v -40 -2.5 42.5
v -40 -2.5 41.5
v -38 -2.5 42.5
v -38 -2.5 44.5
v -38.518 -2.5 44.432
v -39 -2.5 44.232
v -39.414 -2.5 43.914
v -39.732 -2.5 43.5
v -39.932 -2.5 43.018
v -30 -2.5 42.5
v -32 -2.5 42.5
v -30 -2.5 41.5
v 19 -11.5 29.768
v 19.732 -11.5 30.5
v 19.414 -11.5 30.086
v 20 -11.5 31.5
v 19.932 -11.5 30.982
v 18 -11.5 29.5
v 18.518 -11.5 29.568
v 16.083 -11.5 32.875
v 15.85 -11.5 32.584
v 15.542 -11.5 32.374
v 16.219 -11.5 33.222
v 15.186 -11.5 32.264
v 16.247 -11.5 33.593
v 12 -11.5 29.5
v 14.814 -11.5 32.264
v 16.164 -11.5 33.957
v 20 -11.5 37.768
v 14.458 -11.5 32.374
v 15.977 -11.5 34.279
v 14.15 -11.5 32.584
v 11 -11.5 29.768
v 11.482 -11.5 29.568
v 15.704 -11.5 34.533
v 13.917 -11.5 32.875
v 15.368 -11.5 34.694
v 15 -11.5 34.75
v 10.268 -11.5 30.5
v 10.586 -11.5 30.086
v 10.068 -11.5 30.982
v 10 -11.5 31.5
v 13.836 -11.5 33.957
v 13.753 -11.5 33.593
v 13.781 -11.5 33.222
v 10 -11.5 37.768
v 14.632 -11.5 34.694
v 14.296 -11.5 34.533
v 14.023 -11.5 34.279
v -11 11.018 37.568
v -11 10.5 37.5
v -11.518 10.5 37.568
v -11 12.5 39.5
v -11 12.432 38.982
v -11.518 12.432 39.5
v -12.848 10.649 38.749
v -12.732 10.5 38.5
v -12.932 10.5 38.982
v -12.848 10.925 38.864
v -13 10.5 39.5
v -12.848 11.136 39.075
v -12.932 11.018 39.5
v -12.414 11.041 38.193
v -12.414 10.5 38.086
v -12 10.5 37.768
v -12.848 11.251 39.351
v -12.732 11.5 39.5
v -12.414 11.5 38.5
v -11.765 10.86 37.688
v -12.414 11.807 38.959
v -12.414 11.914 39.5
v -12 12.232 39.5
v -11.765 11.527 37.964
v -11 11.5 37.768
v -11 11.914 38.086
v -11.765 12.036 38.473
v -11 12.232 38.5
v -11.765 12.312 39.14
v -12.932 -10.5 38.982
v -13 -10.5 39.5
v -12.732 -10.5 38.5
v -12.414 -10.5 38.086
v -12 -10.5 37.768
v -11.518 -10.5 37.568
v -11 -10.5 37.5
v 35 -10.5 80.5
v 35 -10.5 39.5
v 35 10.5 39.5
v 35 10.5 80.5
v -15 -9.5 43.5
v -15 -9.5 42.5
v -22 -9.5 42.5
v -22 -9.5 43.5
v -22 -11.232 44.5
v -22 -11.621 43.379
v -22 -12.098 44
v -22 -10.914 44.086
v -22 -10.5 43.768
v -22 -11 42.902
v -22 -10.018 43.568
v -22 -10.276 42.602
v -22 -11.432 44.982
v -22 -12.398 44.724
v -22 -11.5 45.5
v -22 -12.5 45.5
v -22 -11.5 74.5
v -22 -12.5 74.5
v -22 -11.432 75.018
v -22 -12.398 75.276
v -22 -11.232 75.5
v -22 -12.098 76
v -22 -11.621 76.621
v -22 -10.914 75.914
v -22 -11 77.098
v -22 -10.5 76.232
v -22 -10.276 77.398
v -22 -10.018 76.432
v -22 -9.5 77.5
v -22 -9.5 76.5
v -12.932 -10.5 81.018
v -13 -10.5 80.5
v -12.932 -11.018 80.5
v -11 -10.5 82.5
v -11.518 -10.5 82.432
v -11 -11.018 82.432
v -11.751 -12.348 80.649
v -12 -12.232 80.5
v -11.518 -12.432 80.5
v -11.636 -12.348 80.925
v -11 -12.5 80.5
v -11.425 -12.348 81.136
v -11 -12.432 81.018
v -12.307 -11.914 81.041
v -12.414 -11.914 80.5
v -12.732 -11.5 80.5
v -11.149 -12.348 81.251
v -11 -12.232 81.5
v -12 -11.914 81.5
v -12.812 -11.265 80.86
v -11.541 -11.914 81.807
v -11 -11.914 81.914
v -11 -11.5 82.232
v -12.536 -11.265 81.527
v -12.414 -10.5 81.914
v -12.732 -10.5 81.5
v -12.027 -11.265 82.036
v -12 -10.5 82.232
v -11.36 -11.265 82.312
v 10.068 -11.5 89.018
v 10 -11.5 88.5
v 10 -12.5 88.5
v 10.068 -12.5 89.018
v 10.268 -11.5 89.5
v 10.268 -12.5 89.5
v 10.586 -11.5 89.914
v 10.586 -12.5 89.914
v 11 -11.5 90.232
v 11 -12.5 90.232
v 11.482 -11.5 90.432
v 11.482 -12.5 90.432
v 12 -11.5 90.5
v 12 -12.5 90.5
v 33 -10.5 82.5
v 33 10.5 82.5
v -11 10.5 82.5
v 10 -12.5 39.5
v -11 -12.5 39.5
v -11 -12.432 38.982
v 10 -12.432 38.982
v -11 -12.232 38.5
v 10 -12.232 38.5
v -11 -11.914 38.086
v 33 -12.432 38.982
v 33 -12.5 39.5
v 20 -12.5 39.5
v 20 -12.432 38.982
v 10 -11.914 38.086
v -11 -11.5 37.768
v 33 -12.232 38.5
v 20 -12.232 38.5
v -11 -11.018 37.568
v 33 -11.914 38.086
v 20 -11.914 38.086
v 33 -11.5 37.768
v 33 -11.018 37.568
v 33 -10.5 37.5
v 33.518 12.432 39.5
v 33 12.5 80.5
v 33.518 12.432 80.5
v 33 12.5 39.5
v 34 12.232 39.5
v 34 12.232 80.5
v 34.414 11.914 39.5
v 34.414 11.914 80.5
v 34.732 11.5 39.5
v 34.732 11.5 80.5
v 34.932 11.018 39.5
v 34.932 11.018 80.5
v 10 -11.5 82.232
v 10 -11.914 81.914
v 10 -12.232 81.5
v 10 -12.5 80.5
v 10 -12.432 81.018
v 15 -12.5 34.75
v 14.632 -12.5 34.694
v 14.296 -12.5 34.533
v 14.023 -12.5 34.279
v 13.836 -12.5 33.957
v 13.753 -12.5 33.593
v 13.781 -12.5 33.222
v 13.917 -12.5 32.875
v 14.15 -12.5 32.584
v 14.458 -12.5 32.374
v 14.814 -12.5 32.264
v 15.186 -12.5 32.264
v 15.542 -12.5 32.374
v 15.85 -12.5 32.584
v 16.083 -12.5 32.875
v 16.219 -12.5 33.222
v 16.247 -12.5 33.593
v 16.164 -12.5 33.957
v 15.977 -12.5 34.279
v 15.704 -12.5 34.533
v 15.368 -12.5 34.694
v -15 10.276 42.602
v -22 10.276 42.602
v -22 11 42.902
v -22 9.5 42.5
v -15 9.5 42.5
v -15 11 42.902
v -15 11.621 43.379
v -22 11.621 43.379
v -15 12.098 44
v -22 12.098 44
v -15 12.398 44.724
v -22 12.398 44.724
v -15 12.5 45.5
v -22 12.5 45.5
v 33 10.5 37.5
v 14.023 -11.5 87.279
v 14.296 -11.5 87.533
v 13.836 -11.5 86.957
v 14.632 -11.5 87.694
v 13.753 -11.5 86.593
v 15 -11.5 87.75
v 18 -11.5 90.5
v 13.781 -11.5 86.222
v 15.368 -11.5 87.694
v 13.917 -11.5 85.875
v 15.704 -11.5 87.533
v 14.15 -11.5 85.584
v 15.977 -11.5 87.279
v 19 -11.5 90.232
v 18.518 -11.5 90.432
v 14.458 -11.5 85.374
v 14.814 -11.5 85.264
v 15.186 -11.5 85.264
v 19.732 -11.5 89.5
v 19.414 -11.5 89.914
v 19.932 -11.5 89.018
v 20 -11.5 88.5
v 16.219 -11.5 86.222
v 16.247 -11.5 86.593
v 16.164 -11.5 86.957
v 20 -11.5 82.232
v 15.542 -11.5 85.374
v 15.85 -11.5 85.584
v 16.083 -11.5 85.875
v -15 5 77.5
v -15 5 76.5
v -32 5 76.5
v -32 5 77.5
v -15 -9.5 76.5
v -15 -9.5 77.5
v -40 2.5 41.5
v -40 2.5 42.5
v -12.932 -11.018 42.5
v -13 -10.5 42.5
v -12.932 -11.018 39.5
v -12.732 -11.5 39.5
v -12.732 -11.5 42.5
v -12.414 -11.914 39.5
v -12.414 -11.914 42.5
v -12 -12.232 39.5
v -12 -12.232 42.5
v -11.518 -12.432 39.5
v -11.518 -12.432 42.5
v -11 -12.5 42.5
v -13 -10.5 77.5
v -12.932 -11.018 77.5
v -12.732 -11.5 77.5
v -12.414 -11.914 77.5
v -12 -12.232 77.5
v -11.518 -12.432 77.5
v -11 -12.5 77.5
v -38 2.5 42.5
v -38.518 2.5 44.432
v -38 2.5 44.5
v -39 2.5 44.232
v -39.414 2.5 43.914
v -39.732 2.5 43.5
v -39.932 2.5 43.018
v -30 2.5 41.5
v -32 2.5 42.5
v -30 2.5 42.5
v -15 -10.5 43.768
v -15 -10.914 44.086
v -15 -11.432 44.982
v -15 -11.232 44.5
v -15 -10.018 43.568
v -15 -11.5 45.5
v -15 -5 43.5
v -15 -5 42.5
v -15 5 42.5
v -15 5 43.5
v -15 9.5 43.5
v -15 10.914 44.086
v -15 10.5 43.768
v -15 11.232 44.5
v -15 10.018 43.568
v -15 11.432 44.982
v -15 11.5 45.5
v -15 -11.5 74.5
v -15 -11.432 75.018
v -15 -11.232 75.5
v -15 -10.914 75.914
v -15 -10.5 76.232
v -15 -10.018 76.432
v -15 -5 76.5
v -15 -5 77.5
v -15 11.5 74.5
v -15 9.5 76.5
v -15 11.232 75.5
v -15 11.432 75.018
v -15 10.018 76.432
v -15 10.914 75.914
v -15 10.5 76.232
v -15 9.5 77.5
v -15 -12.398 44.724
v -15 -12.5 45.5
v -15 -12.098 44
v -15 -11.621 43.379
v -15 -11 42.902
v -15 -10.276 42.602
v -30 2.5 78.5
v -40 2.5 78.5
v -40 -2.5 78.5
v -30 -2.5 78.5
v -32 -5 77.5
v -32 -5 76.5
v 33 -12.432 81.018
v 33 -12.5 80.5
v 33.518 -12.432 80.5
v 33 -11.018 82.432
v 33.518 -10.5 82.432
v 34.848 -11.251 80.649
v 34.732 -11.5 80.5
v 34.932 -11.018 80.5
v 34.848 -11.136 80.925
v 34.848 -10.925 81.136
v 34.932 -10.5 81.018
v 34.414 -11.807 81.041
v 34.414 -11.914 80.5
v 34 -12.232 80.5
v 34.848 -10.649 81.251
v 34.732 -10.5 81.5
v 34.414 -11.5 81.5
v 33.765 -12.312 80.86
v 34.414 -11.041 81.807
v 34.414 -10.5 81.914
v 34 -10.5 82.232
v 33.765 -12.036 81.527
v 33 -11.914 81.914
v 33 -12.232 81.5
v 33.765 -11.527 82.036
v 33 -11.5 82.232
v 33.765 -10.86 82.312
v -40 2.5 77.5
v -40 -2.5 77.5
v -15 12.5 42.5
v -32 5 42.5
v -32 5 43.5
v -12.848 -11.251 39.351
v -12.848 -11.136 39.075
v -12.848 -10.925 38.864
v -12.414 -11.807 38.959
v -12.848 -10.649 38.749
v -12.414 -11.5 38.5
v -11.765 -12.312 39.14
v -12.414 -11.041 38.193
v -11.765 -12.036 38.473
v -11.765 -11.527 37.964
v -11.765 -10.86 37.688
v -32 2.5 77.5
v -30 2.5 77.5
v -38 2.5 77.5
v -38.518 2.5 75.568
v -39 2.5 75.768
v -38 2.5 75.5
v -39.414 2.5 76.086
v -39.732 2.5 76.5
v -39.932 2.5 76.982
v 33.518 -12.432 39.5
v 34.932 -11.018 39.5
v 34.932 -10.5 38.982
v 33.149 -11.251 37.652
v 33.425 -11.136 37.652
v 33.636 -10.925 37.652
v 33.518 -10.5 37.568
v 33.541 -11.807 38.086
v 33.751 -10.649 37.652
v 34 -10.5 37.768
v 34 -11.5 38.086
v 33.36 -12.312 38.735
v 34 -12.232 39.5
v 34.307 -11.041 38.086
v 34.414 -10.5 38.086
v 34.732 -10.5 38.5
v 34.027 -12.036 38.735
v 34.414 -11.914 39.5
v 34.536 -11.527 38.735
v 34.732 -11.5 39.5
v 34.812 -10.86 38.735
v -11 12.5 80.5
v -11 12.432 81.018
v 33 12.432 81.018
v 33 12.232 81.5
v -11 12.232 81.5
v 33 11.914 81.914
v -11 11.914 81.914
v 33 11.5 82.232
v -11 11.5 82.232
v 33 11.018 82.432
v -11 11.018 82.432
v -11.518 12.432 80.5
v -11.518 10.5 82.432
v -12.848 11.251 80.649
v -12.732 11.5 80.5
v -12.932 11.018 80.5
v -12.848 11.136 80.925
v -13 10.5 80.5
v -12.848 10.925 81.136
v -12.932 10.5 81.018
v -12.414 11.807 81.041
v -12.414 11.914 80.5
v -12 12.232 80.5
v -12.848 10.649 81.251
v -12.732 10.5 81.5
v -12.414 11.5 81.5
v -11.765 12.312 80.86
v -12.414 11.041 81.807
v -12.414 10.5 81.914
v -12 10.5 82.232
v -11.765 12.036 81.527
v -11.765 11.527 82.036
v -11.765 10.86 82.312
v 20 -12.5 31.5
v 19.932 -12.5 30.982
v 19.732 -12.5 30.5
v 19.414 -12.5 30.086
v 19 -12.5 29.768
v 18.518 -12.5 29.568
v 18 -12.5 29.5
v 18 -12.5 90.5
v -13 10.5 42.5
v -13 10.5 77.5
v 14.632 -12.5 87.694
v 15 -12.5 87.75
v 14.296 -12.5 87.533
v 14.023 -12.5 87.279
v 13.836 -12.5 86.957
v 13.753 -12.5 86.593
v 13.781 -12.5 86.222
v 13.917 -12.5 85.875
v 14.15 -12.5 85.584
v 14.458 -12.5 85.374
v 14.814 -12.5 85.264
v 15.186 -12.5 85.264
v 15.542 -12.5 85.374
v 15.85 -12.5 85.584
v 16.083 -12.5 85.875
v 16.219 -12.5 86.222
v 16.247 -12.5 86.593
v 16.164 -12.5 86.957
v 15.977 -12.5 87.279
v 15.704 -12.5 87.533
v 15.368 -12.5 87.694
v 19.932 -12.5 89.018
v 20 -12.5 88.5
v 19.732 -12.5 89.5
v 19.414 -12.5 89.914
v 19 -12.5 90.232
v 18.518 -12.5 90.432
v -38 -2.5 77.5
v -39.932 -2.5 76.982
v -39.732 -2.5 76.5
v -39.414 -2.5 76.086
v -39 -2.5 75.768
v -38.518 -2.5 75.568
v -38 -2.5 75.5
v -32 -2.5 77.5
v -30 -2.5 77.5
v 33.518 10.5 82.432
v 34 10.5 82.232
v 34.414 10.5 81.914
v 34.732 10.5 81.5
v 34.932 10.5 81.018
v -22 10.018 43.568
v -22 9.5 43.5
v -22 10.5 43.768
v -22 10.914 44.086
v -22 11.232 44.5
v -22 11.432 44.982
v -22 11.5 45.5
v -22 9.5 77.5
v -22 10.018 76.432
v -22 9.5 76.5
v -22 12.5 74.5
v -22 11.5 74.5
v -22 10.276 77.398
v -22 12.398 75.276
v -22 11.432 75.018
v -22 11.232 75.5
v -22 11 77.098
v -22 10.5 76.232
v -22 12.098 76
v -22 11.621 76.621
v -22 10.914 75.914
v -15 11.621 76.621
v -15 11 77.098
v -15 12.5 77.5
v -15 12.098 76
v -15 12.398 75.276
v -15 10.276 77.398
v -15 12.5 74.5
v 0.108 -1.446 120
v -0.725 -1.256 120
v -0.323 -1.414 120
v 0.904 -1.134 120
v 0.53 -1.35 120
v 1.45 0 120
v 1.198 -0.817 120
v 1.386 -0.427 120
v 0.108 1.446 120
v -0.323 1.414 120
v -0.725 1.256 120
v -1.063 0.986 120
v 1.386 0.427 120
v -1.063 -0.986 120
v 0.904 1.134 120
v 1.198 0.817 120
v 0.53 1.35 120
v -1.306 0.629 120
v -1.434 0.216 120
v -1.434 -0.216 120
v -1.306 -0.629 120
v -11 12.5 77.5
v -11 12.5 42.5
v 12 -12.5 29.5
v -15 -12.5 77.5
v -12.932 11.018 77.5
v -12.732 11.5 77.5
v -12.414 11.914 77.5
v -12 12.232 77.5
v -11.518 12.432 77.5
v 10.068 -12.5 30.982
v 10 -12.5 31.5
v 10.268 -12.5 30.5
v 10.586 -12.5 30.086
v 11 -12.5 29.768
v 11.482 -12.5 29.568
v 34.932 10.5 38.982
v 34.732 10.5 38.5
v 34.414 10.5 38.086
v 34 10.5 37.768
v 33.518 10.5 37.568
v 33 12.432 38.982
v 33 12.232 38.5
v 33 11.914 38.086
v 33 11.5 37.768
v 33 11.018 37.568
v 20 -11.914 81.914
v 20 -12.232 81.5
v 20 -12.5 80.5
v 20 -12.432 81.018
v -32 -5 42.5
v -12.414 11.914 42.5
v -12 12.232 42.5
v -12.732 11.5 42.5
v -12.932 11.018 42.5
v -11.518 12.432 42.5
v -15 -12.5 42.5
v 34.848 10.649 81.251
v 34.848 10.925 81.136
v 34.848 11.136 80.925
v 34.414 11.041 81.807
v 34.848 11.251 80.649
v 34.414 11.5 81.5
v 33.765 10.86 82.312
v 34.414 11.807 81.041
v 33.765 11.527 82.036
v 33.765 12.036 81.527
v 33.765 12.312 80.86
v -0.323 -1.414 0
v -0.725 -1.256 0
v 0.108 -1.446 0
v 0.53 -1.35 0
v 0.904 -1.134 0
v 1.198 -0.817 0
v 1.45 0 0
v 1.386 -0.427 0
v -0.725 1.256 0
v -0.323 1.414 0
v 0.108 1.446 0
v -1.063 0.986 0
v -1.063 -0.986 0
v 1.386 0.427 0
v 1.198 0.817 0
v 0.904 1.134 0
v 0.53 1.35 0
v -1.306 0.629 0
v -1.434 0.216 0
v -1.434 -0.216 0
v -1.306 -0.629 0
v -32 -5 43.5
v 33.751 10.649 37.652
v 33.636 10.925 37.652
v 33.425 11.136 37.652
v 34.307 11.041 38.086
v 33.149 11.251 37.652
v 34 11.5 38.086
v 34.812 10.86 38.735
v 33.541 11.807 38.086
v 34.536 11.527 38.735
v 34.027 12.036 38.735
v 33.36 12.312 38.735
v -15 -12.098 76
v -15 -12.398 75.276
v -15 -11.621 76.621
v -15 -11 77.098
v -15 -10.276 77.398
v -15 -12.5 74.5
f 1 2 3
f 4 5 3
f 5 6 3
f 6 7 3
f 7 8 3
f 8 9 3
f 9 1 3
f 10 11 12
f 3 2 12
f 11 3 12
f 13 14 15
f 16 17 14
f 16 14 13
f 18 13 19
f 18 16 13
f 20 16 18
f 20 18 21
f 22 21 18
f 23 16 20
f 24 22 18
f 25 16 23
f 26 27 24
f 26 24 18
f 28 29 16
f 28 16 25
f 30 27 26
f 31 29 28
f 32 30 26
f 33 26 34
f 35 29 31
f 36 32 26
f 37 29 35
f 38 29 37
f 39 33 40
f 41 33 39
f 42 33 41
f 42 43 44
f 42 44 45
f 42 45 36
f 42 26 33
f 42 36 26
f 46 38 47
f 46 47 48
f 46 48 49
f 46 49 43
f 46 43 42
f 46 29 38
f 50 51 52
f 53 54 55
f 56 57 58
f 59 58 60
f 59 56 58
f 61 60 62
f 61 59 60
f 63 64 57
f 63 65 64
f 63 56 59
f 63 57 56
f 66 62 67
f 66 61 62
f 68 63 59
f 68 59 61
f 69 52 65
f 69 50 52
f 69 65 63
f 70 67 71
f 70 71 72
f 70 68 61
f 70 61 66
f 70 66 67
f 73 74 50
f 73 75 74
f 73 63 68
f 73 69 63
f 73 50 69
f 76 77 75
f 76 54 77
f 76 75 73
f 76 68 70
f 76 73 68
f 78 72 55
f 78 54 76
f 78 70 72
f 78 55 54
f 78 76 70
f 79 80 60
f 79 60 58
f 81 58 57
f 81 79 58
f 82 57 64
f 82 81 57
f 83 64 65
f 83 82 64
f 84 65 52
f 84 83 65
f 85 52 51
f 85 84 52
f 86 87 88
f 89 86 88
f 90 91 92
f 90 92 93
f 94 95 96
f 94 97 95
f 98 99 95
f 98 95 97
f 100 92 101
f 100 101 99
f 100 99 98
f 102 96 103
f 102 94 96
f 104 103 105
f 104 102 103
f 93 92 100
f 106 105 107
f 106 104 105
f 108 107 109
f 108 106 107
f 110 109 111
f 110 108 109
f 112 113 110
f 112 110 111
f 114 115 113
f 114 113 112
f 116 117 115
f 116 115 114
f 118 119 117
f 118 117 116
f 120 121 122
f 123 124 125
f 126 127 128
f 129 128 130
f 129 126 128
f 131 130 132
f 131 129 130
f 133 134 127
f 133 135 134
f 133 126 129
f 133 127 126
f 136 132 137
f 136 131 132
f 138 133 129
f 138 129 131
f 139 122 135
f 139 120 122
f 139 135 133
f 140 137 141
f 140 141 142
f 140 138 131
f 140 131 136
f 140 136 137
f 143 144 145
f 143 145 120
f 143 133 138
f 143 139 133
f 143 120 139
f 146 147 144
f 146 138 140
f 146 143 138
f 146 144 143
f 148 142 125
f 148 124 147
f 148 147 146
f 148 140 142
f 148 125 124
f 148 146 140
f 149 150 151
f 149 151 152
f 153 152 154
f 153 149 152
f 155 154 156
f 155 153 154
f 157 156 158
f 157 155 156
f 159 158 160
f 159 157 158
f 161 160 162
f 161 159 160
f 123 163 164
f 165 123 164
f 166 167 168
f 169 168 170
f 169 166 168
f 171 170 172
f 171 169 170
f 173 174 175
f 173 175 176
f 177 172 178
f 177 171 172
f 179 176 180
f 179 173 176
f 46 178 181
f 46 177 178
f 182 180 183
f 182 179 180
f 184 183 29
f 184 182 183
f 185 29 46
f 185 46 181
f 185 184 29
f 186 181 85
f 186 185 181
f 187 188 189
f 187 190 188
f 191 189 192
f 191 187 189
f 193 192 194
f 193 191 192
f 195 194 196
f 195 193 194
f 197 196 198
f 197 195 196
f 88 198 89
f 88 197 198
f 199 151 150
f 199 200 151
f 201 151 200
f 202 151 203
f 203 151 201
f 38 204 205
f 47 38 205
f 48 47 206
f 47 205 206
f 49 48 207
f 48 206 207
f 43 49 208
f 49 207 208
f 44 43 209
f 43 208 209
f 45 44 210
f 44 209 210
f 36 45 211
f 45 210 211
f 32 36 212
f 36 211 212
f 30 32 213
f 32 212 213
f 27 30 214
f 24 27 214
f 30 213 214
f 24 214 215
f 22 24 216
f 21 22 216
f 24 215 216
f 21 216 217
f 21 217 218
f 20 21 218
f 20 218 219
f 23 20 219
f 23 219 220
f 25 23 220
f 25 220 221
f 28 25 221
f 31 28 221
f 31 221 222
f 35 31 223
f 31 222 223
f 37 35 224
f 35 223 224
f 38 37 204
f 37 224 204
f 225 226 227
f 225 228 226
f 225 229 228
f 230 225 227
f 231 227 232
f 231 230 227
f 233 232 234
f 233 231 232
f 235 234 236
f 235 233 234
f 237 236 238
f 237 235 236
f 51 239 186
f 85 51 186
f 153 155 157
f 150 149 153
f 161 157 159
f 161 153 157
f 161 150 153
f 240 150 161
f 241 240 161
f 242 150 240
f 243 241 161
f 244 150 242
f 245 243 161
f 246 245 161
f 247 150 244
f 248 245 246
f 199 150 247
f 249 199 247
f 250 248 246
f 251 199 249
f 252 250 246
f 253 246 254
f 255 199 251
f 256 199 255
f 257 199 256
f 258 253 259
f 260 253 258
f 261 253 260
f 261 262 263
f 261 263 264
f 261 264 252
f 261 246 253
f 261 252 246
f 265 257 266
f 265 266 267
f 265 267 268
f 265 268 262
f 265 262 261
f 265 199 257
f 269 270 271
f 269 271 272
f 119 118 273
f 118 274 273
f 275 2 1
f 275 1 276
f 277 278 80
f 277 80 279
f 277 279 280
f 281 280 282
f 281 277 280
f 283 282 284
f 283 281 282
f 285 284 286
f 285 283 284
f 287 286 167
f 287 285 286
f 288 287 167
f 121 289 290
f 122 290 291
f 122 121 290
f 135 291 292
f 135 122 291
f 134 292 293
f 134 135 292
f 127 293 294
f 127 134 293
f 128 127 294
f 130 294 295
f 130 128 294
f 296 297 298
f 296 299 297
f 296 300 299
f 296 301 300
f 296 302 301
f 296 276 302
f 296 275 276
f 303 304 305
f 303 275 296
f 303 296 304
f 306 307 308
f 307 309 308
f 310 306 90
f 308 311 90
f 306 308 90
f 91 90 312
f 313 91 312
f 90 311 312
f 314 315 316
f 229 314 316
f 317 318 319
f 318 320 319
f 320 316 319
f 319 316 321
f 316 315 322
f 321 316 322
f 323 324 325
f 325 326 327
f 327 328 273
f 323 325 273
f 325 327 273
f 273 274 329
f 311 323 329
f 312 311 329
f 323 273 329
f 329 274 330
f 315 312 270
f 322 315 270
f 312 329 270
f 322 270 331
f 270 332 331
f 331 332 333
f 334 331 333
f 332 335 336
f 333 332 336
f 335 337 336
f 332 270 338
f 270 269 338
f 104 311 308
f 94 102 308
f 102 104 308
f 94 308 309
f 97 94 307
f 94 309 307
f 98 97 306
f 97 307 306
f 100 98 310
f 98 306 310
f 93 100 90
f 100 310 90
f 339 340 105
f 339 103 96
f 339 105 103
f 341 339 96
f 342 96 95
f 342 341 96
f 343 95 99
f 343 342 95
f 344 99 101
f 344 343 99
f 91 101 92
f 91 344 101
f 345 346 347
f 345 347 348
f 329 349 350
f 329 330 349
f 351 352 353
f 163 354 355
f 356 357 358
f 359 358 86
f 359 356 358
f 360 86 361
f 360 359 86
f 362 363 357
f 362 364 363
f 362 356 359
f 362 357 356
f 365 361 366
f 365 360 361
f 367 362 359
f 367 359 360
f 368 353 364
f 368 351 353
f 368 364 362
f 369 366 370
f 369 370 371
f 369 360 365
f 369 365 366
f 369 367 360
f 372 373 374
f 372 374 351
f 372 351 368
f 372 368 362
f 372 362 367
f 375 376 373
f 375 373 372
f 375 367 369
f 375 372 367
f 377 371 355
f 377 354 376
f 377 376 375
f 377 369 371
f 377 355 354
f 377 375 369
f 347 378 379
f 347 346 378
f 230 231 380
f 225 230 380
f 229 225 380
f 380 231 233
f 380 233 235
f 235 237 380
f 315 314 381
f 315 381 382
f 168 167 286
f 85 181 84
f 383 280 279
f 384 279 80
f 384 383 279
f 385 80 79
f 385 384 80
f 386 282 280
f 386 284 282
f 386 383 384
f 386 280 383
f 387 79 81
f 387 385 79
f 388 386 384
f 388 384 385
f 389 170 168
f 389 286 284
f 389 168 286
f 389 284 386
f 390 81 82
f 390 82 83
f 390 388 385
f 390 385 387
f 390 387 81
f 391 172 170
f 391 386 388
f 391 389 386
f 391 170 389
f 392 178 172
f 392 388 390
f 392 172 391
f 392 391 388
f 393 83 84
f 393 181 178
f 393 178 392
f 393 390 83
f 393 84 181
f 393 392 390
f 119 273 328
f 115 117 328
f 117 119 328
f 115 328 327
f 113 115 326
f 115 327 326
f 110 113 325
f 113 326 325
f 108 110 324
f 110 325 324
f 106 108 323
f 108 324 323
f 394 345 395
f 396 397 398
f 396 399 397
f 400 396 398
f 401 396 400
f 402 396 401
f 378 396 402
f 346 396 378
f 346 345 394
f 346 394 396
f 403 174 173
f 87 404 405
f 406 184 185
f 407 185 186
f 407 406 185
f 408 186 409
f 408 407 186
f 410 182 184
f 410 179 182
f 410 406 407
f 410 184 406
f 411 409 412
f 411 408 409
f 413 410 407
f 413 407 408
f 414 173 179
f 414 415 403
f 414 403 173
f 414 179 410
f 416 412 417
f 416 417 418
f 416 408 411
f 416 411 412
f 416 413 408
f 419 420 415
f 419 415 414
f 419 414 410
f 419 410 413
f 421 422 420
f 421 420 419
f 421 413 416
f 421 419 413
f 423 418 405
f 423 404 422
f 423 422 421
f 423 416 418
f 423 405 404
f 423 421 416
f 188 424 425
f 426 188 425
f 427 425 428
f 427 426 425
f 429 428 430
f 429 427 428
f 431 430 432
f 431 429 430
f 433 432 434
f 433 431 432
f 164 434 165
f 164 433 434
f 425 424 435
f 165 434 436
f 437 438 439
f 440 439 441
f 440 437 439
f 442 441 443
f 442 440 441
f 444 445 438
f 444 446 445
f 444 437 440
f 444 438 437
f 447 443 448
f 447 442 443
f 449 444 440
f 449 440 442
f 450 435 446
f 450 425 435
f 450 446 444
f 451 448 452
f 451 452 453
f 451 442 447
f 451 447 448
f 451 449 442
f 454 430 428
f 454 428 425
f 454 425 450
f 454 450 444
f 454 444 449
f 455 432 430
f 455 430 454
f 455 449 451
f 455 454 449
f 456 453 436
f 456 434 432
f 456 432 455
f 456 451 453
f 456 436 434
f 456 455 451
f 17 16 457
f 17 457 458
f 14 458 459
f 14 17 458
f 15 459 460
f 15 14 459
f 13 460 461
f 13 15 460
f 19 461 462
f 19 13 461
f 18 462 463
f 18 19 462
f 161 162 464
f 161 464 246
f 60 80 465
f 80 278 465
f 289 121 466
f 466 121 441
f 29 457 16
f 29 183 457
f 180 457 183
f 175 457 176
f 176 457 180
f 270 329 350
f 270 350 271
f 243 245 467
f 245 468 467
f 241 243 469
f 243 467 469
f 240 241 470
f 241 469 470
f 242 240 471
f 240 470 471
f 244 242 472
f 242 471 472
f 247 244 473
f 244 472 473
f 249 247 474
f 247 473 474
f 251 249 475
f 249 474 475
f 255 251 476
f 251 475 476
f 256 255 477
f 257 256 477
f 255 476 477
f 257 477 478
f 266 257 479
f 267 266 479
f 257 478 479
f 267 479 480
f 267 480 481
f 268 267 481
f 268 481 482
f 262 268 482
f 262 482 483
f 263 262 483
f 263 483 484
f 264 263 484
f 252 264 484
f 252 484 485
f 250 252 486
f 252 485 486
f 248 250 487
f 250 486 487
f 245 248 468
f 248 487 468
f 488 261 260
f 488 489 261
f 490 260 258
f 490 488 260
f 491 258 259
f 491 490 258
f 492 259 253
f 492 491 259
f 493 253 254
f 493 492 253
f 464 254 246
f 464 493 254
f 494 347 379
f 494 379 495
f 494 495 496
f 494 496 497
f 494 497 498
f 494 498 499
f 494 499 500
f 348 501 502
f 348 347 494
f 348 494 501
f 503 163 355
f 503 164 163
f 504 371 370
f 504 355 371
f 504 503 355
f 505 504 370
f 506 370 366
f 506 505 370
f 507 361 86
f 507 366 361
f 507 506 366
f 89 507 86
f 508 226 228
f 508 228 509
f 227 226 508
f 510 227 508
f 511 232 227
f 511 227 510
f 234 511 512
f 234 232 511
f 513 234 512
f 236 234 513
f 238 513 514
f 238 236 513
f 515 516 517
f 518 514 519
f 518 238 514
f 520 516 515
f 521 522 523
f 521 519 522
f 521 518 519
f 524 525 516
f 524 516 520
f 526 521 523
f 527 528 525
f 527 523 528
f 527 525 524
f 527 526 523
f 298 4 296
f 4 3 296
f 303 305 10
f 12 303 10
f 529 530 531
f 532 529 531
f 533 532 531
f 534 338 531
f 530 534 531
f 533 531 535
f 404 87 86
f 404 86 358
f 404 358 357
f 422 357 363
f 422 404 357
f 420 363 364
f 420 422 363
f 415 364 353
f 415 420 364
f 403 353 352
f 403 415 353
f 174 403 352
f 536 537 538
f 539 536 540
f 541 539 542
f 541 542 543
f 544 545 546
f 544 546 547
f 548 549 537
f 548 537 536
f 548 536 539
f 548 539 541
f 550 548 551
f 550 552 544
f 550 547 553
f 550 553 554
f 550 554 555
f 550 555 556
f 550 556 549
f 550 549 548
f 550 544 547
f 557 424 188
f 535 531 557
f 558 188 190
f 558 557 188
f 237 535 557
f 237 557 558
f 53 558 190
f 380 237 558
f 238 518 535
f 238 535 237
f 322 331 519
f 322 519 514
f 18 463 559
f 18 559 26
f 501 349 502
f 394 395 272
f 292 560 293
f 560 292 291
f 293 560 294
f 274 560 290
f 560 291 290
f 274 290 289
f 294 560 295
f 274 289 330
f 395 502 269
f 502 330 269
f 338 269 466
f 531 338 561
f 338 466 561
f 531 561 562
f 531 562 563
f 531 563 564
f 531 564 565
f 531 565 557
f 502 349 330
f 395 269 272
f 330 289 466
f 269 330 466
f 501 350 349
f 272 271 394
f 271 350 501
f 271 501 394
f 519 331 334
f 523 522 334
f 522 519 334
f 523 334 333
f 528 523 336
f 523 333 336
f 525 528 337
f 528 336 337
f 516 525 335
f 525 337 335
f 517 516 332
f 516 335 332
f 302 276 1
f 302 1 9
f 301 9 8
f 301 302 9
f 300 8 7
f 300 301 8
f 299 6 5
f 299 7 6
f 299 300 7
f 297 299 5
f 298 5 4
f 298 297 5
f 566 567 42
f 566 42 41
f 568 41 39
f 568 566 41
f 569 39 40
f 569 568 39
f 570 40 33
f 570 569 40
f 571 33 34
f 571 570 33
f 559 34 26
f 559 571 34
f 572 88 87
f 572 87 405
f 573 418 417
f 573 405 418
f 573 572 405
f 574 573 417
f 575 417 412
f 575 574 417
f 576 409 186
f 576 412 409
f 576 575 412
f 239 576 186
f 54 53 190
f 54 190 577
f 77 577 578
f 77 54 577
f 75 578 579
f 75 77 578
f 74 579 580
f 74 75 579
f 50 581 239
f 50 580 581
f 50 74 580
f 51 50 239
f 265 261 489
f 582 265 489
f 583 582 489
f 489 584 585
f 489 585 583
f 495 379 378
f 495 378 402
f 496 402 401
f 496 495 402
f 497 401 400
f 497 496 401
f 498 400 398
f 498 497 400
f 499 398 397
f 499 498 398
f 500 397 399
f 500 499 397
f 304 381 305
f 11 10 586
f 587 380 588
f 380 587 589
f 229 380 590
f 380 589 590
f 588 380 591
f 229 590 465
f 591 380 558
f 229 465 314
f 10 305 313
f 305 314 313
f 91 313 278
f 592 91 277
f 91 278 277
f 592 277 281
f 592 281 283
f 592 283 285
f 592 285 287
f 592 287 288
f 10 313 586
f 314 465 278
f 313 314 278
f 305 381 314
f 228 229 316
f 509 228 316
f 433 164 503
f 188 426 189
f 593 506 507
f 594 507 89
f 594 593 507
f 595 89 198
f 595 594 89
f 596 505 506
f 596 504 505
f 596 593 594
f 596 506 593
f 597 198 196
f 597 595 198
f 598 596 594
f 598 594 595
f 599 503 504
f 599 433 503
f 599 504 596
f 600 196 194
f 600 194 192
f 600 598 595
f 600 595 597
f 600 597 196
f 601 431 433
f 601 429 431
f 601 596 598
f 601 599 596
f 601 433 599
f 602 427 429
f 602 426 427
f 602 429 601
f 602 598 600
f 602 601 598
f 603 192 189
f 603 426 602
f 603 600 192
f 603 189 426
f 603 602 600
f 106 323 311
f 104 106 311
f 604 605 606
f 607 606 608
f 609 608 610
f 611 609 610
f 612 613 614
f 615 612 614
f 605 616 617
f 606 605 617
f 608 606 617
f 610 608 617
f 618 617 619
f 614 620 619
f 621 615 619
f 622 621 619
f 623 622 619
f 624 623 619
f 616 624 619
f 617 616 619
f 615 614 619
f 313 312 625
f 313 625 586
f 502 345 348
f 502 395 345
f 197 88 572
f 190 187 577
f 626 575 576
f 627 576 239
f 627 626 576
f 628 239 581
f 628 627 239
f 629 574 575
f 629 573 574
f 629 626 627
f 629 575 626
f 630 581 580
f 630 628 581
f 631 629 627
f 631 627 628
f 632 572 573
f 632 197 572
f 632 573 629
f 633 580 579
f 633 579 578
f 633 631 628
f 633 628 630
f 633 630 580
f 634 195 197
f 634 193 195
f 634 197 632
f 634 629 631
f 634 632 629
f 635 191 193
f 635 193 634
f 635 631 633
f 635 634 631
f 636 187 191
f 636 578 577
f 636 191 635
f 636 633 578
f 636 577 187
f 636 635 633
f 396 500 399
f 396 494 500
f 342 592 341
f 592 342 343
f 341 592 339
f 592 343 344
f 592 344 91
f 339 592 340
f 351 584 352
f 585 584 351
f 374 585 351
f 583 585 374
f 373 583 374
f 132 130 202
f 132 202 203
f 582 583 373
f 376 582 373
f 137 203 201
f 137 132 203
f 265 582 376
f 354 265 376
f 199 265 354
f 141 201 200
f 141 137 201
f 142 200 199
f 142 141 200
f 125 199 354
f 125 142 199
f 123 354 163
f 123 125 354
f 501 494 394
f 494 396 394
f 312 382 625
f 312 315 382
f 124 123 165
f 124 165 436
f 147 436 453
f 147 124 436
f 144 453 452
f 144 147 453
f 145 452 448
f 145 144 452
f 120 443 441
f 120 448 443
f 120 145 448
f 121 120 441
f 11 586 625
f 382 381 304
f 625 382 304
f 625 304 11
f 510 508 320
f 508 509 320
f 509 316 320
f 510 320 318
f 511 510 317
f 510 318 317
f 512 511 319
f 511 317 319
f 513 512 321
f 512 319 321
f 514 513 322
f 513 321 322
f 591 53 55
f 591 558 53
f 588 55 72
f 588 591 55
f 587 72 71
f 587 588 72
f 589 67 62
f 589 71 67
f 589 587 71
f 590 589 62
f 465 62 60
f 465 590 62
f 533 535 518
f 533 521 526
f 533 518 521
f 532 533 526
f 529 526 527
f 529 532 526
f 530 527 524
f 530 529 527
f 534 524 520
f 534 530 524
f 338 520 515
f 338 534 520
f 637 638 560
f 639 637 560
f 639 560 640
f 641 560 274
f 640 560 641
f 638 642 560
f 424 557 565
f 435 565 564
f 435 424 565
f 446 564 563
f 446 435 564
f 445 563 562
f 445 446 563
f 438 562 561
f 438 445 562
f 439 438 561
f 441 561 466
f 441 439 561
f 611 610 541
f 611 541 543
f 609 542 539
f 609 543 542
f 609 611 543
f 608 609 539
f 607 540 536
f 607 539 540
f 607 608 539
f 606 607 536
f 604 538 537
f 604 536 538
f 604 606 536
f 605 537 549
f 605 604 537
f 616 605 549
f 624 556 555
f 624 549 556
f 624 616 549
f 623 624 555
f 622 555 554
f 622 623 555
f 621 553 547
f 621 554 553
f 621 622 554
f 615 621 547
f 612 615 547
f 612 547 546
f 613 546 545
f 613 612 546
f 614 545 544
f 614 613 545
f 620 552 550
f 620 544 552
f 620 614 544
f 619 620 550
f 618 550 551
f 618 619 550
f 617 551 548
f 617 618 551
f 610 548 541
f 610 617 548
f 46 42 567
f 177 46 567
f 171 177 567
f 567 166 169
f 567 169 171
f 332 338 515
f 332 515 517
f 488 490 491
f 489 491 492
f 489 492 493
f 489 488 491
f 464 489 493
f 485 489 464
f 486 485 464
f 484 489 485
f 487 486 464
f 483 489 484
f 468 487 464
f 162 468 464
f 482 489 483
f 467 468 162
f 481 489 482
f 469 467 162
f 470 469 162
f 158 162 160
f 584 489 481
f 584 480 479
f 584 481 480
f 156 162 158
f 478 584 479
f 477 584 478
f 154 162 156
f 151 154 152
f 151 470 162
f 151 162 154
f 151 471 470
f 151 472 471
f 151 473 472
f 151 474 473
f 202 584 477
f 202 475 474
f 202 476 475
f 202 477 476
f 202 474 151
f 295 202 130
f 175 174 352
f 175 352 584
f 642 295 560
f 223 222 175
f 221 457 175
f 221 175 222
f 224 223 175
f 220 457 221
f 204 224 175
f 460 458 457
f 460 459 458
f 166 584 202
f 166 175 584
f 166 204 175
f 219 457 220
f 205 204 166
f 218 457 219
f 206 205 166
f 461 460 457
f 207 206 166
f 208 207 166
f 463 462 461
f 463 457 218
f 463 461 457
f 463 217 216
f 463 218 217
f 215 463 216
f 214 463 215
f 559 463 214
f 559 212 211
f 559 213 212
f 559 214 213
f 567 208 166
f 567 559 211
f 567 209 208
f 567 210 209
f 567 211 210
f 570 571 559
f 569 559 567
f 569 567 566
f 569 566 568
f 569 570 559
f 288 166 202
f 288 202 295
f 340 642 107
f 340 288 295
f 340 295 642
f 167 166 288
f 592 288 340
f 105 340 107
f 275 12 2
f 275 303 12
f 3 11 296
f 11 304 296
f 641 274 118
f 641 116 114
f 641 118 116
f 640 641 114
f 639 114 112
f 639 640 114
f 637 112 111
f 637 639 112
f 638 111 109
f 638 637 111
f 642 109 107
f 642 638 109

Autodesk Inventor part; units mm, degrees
ref_plane "YZ Plane" through (0, 0, 0) normal (1, 0, 0) x (0, 1, 0)
sketch "Sketch1" plane through (0, 0, 0) normal (0, 0, 1) x (1, 0, 0)
  circle A0 centre (0, 0) radius 1.45
  dimension "d0" = 2.9
extrude "Extrusion1" add sketch "Sketch1" along normal blind 120
sketch "Sketch2" plane through (0, 0, 0) normal (1, 0, 0) x (0, 1, 0)
  line L0 (1.45, 120) -> (-1.45, 120) projected
  line L1 (-1.45, 0) -> (1.45, 0) projected
  line L2 (1.45, 0) -> (1.45, 120) projected
  line L3 (-1.45, 0) -> (-1.45, 120) projected
  line L4 (1.45, 0) -> (-1.45, 120) construction
  line L5 (1.45, 120) -> (-1.45, 0) construction
  line L6 (12.5, 37.5) -> (-12.5, 37.5)
  line L7 (-12.5, 37.5) -> (-12.5, 82.5)
  line L8 (-12.5, 82.5) -> (12.5, 82.5)
  line L9 (12.5, 82.5) -> (12.5, 37.5)
  line L10 (12.5, 37.5) -> (-12.5, 82.5) construction
  line L11 (-12.5, 37.5) -> (12.5, 82.5) construction
  line L12 (12.5, 42.5) -> (-12.5, 42.5)
  line L13 (-12.5, 42.5) -> (-12.5, 77.5)
  line L14 (-12.5, 77.5) -> (12.5, 77.5)
  line L15 (12.5, 77.5) -> (12.5, 42.5)
  line L16 (12.5, 42.5) -> (-12.5, 77.5) construction
  line L17 (-12.5, 42.5) -> (12.5, 77.5) construction
  point P0 (0, 60)
  dimension "d3" = 25
  dimension "d4" = 45
  dimension "d7" = 25
  dimension "d8" = 35
extrude "Extrusion2" add sketch "Sketch2" along normal blind 35 separate body contours L8 L9 L14 L2 | L2 L14 L3 L8 | L3 L14 L7 L8 | L14 L9 L12 L2 | L2 L12 L3 L14 | L3 L12 L7 L14 | L12 L9 L6 L2 | L2 L6 L3 L12 | L3 L6 L7 L12
extrude "Extrusion3" add sketch "Sketch2" against normal blind 15 contours L14 L9 L12 L2 | L2 L12 L3 L14 | L3 L12 L7 L14 bodies 2
sketch "Sketch3" plane through (-15, 0, 0) normal (-1, 0, 0) x (0, 0, 1)
  line L0 (42.5, 12.5) -> (42.5, -12.5) construction
  line L1 (37.5, -12.5) -> (82.5, -12.5) construction
  line L2 (42.5, 12.5) -> (77.5, 12.5) construction
  line L3 (77.5, 12.5) -> (77.5, -12.5) construction
  line L4 (77.5, -12.5) -> (42.5, -12.5) construction
  line L5 (42.5, -12.5) -> (42.5, 12.5) construction
  line L6 (77.5, 12.5) -> (77.5, -12.5) construction
  line L7 (42.5, 12.5) -> (77.5, 12.5) construction
  line L8 (77.5, 12.5) -> (77.5, 9.5) construction
  line L9 (77.5, 9.5) -> (42.5, 9.5) construction
  line L10 (42.5, 9.5) -> (42.5, 12.5) construction
  line L11 (77.5, 12.5) -> (77.5, -12.5) construction
  line L12 (42.5, -12.5) -> (77.5, -12.5) construction
  line L13 (77.5, -12.5) -> (77.5, -9.5) construction
  line L14 (77.5, -9.5) -> (42.5, -9.5) construction
  line L15 (42.5, -9.5) -> (42.5, -12.5) construction
  arc A0 (45.5, 12.5) -> (42.5, 9.5) centre (45.5, 9.5) ccw
  arc A1 (77.5, 9.5) -> (74.5, 12.5) centre (74.5, 9.5) ccw
  line L16 (45.5, 12.5) -> (74.5, 12.5)
  line L17 (37.5, 12.5) -> (82.5, 12.5) projected
  arc A2 (42.5, -9.5) -> (45.5, -12.5) centre (45.5, -9.5) ccw
  arc A3 (74.5, -12.5) -> (77.5, -9.5) centre (74.5, -9.5) ccw
  line L18 (45.5, -12.5) -> (74.5, -12.5)
  line L19 (42.5, 9.5) -> (43.5, 9.5)
  line L20 (77.5, 9.5) -> (76.5, 9.5)
  arc A4 (45.5, 11.5) -> (43.5, 9.5) centre (45.5, 9.5) ccw
  arc A5 (76.5, 9.5) -> (74.5, 11.5) centre (74.5, 9.5) ccw
  line L21 (74.5, 11.5) -> (45.5, 11.5)
  line L22 (42.5, -9.5) -> (43.5, -9.5)
  line L23 (77.5, -9.5) -> (76.5, -9.5)
  arc A6 (43.5, -9.5) -> (45.5, -11.5) centre (45.5, -9.5) ccw
  arc A7 (74.5, -11.5) -> (76.5, -9.5) centre (74.5, -9.5) ccw
  line L24 (74.5, -11.5) -> (45.5, -11.5)
  line L25 (42.5, 5) -> (43.5, 5)
  line L26 (43.5, 5) -> (43.5, -5)
  line L27 (43.5, -5) -> (42.5, -5)
  line L28 (42.5, -5) -> (42.5, 5)
  line L29 (42.5, 5) -> (43.5, -5) construction
  line L30 (43.5, 5) -> (42.5, -5) construction
  line L31 (77.5, -12.5) -> (77.5, 12.5) projected
  line L32 (76.5, 5) -> (77.5, 5)
  line L33 (77.5, 5) -> (77.5, -5)
  line L34 (77.5, -5) -> (76.5, -5)
  line L35 (76.5, -5) -> (76.5, 5)
  line L36 (76.5, 5) -> (77.5, -5) construction
  line L37 (77.5, 5) -> (76.5, -5) construction
  line L38 (42.5, 0) -> (77.5, 0) construction
  line L39 (42.5, 9.5) -> (43.5, 9.5) construction
  line L40 (43.5, 9.5) -> (43.5, -9.5) construction
  line L41 (43.5, -9.5) -> (42.5, -9.5) construction
  line L42 (42.5, -9.5) -> (42.5, 9.5) construction
  point P0 (0, 0)
  point P1 (77.5, 1.45)
  point P2 (77.5, -1.45)
  point P3 (43, 0)
  point P4 (77, 0)
  point P5 (43, 0)
  dimension "d11" = 3
  dimension "d12" = 3
  dimension "d13" = 1
  dimension "d14" = 1
  dimension "d15" = 1
  dimension "d16" = 1
  dimension "d17" = 1
  dimension "d18" = 1
  dimension "d21" = 10
  dimension "d22" = 10
  dimension "d23" = 35
  dimension "d24" = 17.5
  dimension "d25" = 32
extrude "Extrusion4" add sketch "Sketch3" along normal blind 7 contours L16 A1 L20 A5 L21 A4 L19 A0 | A3 L18 A2 L22 A6 L24 A7 L23 bodies 2
extrude "Extrusion5" add sketch "Sketch3" along normal blind 17 contours L31 L34 L35 L32 | L25 L26 L27 L28 bodies 2
sketch "Sketch5" plane through (-15, 12.5, 77.5) normal (0, 0, 1) x (1, 0, 0)
  line L0 (-25, -10) -> (-15, -10) construction
  line L1 (-15, -10) -> (-15, -15) construction
  line L2 (-15, -15) -> (-25, -15) construction
  line L3 (-25, -15) -> (-25, -10) construction
  line L4 (-25, -10) -> (-15, -15) construction
  line L5 (-15, -10) -> (-25, -15) construction
  line L6 (0, -17.5) -> (0, -7.5) construction
  line L7 (-25, -10) -> (-15, -10)
  line L8 (-15, -10) -> (-15, -15)
  line L9 (-15, -15) -> (-25, -15)
  line L10 (-25, -15) -> (-25, -10)
  point P0 (15, -12.5)
  point P1 (-20, -12.5)
  dimension "d28" = 10
  dimension "d29" = 5
  dimension "d32" = 15
extrude "Extrusion6" add sketch "Sketch5" along normal blind 1 bodies 2
sketch "Sketch6" plane through (0, -12.5, 42.5) normal (0, 0, -1) x (-1, 0, 0)
  line L0 (40, 15) -> (30, 15) projected
  line L1 (40, 10) -> (40, 15) projected
  line L2 (32, 10) -> (40, 10) projected
  line L3 (30, 15) -> (30, 10) projected
  line L4 (30, 10) -> (32, 10) projected
  point P0 (0, 12.5)
extrude "Extrusion7" add sketch "Sketch6" along normal blind 1 bodies 2
extrude "Extrusion8" add sketch "Sketch2" against normal blind 13 contours L8 L9 L14 L2 | L2 L14 L3 L8 | L3 L14 L7 L8 | L14 L9 L12 L2 | L2 L12 L3 L14 | L3 L12 L7 L14 | L12 L9 L6 L2 | L2 L6 L3 L12 | L3 L6 L7 L12 bodies 2
extrude "Extrusion9" cut sketch "Sketch2" against normal blind 13 contours L14 L9 L12 L2 | L2 L12 L3 L14 | L3 L12 L7 L14 bodies 1
sketch "Sketch11" plane through (0, -1.45, 42.5) normal (0, 0, 1) x (1, 0, 0)
  arc A0 (0, 2.9) -> (0, 0) centre (0, 1.45) ccw projected
  line L0 (0, 2.9) -> (0, 0) projected
extrude "Extrusion12" add sketch "Sketch11" along normal up to surface (35 mm away) bodies 1
sketch "Sketch9" plane through (0, -12.5, 42.5) normal (0, 0, 1) x (1, 0, 0)
  line L0 (-40, 10) -> (-40, 15) projected
  line L1 (-40, 15) -> (-30, 15) projected
  line L2 (-40, 10) -> (-38, 10)
  line L3 (-38, 10) -> (-38, 15)
  line L4 (-38, 15) -> (-40, 15)
  line L5 (-40, 15) -> (-40, 10)
  point P0 (0, 12.5)
  dimension "d43" = 2
extrude "Extrusion10" add sketch "Sketch9" along normal blind 2 bodies 2
sketch "Sketch10" plane through (-15, 12.5, 77.5) normal (0, 0, -1) x (-1, 0, 0)
  line L0 (25, -15) -> (23, -15) projected
  line L1 (23, -15) -> (23, -10) projected
  line L2 (23, -10) -> (25, -10) projected
  line L3 (25, -10) -> (25, -15) projected
  point P0 (-15, -12.5)
extrude "Extrusion11" add sketch "Sketch10" along normal blind 2 bodies 2
fillet "Fillet1" radius 2 2 edges at (-40, 0, 75.5) (-40, 0, 44.5)
fillet "Fillet5" radius 2 14 edges at (11, 12.5, 82.5) (-13, 0, 82.5) (11, -12.5, 82.5) (35, 0, 82.5) (35, 12.5, 60) (35, -12.5, 60) (35, 0, 37.5) (11, 12.5, 37.5) (11, -12.5, 37.5) (-13, 0, 37.5) (-13, 12.5, 40) (-13, -12.5, 40) (-13, -12.5, 80) (-13, 12.5, 80)
ref_plane "Work Plane1" through (-13, -6.25, 39.5) normal (0, 0, -1) x (0, 1, 0)
sketch "Sketch14" plane through (-13, -6.25, 39.5) normal (0, 0, -1) x (0, 1, 0)
  line L0 (-6.25, 2) -> (-6.25, 46) projected
  line L1 (-6.25, 33) -> (-5.25, 33)
  line L2 (-5.25, 33) -> (-5.25, 23)
  line L3 (-5.25, 23) -> (-6.25, 23)
  line L4 (-6.25, 23) -> (-6.25, 33)
  line L5 (-4.25, 48) -> (16.75, 48) projected
  point P0 (6.25, 13)
  dimension "d63" = 1
  dimension "d64" = 10
  dimension "d68" = 15
extrude "Extrusion14" add sketch "Sketch14" along normal blind 10 bodies 2
fillet "Fillet7" radius 2 2 edges at (20, -12, 29.5) (10, -12, 29.5)
ref_plane "Work Plane2" through (35, 6.25, 80.5) normal (0, 0, 1) x (0, 1, 0)
sketch "Sketch15" plane through (35, 6.25, 80.5) normal (0, 0, 1) x (0, 1, 0)
  line L0 (-17.75, 15) -> (-18.75, 15) projected
  line L1 (-18.75, 17) -> (-18.75, 23) projected
  line L2 (-18.75, 15) -> (-18.75, 17) projected
  line L3 (-17.75, 17) -> (-17.75, 15) projected
  line L4 (-17.75, 23) -> (-17.75, 17) projected
  line L5 (-17.75, 25) -> (-17.75, 23) projected
  line L6 (-18.75, 25) -> (-17.75, 25) projected
  line L7 (-18.75, 23) -> (-18.75, 25) projected
  line L8 (-18.75, 46) -> (-18.75, 2) projected
  point P0 (-6.25, 35)
extrude "Extrusion15" add sketch "Sketch15" along normal blind 10 bodies 2
fillet "Fillet8" radius 2 2 edges at (20, -12, 90.5) (10, -12, 90.5)
sketch "Sketch16" plane through (10, -11.5, 37.7679) normal (0, 1, 0) x (1, 0, 0)
  line L0 (0, 0) -> (0, 6.2679) projected
  line L1 (10, 0) -> (10, 6.2679) projected
  line L2 (23, 0.2679) -> (-21, 0.2679) projected
  line L3 (2, 8.2679) -> (8, 8.2679) projected
  point P0 (-10, 37.7679)
  point P1 (5, 4.2679)
  dimension "d72" = 10
  dimension "d73" = 5
  dimension "d74" = 8
  dimension "d75" = 4
hole "Hole1" at (15, -11.5, 33.5) direction (0, -1, 0) diameter 2.5 end through all bodies 2
sketch "Sketch17" plane through (10, -11.5, 82.2321) normal (0, 1, 0) x (1, 0, 0)
  line L0 (10, 0) -> (10, -6.2679) projected
  line L1 (0, 0) -> (0, -6.2679) projected
  line L2 (-21, -0.2679) -> (23, -0.2679) projected
  line L3 (8, -8.2679) -> (2, -8.2679) projected
  point P0 (-10, 82.2321)
  point P1 (5, -4.2679)
  dimension "d83" = 10
  dimension "d84" = 5
  dimension "d85" = 8
  dimension "d86" = 4
hole "Hole2" at (15, -11.5, 86.5) direction (0, -1, 0) diameter 2.5 end through all bodies 2
equation "\"d73\" = 0.5 * d72"
equation "\"d75\" = 0.5 * d74"
equation "\"d84\" = 0.5 * d83"
equation "\"d86\" = 0.5 * d85"
properties material "Iron, Malleable"
